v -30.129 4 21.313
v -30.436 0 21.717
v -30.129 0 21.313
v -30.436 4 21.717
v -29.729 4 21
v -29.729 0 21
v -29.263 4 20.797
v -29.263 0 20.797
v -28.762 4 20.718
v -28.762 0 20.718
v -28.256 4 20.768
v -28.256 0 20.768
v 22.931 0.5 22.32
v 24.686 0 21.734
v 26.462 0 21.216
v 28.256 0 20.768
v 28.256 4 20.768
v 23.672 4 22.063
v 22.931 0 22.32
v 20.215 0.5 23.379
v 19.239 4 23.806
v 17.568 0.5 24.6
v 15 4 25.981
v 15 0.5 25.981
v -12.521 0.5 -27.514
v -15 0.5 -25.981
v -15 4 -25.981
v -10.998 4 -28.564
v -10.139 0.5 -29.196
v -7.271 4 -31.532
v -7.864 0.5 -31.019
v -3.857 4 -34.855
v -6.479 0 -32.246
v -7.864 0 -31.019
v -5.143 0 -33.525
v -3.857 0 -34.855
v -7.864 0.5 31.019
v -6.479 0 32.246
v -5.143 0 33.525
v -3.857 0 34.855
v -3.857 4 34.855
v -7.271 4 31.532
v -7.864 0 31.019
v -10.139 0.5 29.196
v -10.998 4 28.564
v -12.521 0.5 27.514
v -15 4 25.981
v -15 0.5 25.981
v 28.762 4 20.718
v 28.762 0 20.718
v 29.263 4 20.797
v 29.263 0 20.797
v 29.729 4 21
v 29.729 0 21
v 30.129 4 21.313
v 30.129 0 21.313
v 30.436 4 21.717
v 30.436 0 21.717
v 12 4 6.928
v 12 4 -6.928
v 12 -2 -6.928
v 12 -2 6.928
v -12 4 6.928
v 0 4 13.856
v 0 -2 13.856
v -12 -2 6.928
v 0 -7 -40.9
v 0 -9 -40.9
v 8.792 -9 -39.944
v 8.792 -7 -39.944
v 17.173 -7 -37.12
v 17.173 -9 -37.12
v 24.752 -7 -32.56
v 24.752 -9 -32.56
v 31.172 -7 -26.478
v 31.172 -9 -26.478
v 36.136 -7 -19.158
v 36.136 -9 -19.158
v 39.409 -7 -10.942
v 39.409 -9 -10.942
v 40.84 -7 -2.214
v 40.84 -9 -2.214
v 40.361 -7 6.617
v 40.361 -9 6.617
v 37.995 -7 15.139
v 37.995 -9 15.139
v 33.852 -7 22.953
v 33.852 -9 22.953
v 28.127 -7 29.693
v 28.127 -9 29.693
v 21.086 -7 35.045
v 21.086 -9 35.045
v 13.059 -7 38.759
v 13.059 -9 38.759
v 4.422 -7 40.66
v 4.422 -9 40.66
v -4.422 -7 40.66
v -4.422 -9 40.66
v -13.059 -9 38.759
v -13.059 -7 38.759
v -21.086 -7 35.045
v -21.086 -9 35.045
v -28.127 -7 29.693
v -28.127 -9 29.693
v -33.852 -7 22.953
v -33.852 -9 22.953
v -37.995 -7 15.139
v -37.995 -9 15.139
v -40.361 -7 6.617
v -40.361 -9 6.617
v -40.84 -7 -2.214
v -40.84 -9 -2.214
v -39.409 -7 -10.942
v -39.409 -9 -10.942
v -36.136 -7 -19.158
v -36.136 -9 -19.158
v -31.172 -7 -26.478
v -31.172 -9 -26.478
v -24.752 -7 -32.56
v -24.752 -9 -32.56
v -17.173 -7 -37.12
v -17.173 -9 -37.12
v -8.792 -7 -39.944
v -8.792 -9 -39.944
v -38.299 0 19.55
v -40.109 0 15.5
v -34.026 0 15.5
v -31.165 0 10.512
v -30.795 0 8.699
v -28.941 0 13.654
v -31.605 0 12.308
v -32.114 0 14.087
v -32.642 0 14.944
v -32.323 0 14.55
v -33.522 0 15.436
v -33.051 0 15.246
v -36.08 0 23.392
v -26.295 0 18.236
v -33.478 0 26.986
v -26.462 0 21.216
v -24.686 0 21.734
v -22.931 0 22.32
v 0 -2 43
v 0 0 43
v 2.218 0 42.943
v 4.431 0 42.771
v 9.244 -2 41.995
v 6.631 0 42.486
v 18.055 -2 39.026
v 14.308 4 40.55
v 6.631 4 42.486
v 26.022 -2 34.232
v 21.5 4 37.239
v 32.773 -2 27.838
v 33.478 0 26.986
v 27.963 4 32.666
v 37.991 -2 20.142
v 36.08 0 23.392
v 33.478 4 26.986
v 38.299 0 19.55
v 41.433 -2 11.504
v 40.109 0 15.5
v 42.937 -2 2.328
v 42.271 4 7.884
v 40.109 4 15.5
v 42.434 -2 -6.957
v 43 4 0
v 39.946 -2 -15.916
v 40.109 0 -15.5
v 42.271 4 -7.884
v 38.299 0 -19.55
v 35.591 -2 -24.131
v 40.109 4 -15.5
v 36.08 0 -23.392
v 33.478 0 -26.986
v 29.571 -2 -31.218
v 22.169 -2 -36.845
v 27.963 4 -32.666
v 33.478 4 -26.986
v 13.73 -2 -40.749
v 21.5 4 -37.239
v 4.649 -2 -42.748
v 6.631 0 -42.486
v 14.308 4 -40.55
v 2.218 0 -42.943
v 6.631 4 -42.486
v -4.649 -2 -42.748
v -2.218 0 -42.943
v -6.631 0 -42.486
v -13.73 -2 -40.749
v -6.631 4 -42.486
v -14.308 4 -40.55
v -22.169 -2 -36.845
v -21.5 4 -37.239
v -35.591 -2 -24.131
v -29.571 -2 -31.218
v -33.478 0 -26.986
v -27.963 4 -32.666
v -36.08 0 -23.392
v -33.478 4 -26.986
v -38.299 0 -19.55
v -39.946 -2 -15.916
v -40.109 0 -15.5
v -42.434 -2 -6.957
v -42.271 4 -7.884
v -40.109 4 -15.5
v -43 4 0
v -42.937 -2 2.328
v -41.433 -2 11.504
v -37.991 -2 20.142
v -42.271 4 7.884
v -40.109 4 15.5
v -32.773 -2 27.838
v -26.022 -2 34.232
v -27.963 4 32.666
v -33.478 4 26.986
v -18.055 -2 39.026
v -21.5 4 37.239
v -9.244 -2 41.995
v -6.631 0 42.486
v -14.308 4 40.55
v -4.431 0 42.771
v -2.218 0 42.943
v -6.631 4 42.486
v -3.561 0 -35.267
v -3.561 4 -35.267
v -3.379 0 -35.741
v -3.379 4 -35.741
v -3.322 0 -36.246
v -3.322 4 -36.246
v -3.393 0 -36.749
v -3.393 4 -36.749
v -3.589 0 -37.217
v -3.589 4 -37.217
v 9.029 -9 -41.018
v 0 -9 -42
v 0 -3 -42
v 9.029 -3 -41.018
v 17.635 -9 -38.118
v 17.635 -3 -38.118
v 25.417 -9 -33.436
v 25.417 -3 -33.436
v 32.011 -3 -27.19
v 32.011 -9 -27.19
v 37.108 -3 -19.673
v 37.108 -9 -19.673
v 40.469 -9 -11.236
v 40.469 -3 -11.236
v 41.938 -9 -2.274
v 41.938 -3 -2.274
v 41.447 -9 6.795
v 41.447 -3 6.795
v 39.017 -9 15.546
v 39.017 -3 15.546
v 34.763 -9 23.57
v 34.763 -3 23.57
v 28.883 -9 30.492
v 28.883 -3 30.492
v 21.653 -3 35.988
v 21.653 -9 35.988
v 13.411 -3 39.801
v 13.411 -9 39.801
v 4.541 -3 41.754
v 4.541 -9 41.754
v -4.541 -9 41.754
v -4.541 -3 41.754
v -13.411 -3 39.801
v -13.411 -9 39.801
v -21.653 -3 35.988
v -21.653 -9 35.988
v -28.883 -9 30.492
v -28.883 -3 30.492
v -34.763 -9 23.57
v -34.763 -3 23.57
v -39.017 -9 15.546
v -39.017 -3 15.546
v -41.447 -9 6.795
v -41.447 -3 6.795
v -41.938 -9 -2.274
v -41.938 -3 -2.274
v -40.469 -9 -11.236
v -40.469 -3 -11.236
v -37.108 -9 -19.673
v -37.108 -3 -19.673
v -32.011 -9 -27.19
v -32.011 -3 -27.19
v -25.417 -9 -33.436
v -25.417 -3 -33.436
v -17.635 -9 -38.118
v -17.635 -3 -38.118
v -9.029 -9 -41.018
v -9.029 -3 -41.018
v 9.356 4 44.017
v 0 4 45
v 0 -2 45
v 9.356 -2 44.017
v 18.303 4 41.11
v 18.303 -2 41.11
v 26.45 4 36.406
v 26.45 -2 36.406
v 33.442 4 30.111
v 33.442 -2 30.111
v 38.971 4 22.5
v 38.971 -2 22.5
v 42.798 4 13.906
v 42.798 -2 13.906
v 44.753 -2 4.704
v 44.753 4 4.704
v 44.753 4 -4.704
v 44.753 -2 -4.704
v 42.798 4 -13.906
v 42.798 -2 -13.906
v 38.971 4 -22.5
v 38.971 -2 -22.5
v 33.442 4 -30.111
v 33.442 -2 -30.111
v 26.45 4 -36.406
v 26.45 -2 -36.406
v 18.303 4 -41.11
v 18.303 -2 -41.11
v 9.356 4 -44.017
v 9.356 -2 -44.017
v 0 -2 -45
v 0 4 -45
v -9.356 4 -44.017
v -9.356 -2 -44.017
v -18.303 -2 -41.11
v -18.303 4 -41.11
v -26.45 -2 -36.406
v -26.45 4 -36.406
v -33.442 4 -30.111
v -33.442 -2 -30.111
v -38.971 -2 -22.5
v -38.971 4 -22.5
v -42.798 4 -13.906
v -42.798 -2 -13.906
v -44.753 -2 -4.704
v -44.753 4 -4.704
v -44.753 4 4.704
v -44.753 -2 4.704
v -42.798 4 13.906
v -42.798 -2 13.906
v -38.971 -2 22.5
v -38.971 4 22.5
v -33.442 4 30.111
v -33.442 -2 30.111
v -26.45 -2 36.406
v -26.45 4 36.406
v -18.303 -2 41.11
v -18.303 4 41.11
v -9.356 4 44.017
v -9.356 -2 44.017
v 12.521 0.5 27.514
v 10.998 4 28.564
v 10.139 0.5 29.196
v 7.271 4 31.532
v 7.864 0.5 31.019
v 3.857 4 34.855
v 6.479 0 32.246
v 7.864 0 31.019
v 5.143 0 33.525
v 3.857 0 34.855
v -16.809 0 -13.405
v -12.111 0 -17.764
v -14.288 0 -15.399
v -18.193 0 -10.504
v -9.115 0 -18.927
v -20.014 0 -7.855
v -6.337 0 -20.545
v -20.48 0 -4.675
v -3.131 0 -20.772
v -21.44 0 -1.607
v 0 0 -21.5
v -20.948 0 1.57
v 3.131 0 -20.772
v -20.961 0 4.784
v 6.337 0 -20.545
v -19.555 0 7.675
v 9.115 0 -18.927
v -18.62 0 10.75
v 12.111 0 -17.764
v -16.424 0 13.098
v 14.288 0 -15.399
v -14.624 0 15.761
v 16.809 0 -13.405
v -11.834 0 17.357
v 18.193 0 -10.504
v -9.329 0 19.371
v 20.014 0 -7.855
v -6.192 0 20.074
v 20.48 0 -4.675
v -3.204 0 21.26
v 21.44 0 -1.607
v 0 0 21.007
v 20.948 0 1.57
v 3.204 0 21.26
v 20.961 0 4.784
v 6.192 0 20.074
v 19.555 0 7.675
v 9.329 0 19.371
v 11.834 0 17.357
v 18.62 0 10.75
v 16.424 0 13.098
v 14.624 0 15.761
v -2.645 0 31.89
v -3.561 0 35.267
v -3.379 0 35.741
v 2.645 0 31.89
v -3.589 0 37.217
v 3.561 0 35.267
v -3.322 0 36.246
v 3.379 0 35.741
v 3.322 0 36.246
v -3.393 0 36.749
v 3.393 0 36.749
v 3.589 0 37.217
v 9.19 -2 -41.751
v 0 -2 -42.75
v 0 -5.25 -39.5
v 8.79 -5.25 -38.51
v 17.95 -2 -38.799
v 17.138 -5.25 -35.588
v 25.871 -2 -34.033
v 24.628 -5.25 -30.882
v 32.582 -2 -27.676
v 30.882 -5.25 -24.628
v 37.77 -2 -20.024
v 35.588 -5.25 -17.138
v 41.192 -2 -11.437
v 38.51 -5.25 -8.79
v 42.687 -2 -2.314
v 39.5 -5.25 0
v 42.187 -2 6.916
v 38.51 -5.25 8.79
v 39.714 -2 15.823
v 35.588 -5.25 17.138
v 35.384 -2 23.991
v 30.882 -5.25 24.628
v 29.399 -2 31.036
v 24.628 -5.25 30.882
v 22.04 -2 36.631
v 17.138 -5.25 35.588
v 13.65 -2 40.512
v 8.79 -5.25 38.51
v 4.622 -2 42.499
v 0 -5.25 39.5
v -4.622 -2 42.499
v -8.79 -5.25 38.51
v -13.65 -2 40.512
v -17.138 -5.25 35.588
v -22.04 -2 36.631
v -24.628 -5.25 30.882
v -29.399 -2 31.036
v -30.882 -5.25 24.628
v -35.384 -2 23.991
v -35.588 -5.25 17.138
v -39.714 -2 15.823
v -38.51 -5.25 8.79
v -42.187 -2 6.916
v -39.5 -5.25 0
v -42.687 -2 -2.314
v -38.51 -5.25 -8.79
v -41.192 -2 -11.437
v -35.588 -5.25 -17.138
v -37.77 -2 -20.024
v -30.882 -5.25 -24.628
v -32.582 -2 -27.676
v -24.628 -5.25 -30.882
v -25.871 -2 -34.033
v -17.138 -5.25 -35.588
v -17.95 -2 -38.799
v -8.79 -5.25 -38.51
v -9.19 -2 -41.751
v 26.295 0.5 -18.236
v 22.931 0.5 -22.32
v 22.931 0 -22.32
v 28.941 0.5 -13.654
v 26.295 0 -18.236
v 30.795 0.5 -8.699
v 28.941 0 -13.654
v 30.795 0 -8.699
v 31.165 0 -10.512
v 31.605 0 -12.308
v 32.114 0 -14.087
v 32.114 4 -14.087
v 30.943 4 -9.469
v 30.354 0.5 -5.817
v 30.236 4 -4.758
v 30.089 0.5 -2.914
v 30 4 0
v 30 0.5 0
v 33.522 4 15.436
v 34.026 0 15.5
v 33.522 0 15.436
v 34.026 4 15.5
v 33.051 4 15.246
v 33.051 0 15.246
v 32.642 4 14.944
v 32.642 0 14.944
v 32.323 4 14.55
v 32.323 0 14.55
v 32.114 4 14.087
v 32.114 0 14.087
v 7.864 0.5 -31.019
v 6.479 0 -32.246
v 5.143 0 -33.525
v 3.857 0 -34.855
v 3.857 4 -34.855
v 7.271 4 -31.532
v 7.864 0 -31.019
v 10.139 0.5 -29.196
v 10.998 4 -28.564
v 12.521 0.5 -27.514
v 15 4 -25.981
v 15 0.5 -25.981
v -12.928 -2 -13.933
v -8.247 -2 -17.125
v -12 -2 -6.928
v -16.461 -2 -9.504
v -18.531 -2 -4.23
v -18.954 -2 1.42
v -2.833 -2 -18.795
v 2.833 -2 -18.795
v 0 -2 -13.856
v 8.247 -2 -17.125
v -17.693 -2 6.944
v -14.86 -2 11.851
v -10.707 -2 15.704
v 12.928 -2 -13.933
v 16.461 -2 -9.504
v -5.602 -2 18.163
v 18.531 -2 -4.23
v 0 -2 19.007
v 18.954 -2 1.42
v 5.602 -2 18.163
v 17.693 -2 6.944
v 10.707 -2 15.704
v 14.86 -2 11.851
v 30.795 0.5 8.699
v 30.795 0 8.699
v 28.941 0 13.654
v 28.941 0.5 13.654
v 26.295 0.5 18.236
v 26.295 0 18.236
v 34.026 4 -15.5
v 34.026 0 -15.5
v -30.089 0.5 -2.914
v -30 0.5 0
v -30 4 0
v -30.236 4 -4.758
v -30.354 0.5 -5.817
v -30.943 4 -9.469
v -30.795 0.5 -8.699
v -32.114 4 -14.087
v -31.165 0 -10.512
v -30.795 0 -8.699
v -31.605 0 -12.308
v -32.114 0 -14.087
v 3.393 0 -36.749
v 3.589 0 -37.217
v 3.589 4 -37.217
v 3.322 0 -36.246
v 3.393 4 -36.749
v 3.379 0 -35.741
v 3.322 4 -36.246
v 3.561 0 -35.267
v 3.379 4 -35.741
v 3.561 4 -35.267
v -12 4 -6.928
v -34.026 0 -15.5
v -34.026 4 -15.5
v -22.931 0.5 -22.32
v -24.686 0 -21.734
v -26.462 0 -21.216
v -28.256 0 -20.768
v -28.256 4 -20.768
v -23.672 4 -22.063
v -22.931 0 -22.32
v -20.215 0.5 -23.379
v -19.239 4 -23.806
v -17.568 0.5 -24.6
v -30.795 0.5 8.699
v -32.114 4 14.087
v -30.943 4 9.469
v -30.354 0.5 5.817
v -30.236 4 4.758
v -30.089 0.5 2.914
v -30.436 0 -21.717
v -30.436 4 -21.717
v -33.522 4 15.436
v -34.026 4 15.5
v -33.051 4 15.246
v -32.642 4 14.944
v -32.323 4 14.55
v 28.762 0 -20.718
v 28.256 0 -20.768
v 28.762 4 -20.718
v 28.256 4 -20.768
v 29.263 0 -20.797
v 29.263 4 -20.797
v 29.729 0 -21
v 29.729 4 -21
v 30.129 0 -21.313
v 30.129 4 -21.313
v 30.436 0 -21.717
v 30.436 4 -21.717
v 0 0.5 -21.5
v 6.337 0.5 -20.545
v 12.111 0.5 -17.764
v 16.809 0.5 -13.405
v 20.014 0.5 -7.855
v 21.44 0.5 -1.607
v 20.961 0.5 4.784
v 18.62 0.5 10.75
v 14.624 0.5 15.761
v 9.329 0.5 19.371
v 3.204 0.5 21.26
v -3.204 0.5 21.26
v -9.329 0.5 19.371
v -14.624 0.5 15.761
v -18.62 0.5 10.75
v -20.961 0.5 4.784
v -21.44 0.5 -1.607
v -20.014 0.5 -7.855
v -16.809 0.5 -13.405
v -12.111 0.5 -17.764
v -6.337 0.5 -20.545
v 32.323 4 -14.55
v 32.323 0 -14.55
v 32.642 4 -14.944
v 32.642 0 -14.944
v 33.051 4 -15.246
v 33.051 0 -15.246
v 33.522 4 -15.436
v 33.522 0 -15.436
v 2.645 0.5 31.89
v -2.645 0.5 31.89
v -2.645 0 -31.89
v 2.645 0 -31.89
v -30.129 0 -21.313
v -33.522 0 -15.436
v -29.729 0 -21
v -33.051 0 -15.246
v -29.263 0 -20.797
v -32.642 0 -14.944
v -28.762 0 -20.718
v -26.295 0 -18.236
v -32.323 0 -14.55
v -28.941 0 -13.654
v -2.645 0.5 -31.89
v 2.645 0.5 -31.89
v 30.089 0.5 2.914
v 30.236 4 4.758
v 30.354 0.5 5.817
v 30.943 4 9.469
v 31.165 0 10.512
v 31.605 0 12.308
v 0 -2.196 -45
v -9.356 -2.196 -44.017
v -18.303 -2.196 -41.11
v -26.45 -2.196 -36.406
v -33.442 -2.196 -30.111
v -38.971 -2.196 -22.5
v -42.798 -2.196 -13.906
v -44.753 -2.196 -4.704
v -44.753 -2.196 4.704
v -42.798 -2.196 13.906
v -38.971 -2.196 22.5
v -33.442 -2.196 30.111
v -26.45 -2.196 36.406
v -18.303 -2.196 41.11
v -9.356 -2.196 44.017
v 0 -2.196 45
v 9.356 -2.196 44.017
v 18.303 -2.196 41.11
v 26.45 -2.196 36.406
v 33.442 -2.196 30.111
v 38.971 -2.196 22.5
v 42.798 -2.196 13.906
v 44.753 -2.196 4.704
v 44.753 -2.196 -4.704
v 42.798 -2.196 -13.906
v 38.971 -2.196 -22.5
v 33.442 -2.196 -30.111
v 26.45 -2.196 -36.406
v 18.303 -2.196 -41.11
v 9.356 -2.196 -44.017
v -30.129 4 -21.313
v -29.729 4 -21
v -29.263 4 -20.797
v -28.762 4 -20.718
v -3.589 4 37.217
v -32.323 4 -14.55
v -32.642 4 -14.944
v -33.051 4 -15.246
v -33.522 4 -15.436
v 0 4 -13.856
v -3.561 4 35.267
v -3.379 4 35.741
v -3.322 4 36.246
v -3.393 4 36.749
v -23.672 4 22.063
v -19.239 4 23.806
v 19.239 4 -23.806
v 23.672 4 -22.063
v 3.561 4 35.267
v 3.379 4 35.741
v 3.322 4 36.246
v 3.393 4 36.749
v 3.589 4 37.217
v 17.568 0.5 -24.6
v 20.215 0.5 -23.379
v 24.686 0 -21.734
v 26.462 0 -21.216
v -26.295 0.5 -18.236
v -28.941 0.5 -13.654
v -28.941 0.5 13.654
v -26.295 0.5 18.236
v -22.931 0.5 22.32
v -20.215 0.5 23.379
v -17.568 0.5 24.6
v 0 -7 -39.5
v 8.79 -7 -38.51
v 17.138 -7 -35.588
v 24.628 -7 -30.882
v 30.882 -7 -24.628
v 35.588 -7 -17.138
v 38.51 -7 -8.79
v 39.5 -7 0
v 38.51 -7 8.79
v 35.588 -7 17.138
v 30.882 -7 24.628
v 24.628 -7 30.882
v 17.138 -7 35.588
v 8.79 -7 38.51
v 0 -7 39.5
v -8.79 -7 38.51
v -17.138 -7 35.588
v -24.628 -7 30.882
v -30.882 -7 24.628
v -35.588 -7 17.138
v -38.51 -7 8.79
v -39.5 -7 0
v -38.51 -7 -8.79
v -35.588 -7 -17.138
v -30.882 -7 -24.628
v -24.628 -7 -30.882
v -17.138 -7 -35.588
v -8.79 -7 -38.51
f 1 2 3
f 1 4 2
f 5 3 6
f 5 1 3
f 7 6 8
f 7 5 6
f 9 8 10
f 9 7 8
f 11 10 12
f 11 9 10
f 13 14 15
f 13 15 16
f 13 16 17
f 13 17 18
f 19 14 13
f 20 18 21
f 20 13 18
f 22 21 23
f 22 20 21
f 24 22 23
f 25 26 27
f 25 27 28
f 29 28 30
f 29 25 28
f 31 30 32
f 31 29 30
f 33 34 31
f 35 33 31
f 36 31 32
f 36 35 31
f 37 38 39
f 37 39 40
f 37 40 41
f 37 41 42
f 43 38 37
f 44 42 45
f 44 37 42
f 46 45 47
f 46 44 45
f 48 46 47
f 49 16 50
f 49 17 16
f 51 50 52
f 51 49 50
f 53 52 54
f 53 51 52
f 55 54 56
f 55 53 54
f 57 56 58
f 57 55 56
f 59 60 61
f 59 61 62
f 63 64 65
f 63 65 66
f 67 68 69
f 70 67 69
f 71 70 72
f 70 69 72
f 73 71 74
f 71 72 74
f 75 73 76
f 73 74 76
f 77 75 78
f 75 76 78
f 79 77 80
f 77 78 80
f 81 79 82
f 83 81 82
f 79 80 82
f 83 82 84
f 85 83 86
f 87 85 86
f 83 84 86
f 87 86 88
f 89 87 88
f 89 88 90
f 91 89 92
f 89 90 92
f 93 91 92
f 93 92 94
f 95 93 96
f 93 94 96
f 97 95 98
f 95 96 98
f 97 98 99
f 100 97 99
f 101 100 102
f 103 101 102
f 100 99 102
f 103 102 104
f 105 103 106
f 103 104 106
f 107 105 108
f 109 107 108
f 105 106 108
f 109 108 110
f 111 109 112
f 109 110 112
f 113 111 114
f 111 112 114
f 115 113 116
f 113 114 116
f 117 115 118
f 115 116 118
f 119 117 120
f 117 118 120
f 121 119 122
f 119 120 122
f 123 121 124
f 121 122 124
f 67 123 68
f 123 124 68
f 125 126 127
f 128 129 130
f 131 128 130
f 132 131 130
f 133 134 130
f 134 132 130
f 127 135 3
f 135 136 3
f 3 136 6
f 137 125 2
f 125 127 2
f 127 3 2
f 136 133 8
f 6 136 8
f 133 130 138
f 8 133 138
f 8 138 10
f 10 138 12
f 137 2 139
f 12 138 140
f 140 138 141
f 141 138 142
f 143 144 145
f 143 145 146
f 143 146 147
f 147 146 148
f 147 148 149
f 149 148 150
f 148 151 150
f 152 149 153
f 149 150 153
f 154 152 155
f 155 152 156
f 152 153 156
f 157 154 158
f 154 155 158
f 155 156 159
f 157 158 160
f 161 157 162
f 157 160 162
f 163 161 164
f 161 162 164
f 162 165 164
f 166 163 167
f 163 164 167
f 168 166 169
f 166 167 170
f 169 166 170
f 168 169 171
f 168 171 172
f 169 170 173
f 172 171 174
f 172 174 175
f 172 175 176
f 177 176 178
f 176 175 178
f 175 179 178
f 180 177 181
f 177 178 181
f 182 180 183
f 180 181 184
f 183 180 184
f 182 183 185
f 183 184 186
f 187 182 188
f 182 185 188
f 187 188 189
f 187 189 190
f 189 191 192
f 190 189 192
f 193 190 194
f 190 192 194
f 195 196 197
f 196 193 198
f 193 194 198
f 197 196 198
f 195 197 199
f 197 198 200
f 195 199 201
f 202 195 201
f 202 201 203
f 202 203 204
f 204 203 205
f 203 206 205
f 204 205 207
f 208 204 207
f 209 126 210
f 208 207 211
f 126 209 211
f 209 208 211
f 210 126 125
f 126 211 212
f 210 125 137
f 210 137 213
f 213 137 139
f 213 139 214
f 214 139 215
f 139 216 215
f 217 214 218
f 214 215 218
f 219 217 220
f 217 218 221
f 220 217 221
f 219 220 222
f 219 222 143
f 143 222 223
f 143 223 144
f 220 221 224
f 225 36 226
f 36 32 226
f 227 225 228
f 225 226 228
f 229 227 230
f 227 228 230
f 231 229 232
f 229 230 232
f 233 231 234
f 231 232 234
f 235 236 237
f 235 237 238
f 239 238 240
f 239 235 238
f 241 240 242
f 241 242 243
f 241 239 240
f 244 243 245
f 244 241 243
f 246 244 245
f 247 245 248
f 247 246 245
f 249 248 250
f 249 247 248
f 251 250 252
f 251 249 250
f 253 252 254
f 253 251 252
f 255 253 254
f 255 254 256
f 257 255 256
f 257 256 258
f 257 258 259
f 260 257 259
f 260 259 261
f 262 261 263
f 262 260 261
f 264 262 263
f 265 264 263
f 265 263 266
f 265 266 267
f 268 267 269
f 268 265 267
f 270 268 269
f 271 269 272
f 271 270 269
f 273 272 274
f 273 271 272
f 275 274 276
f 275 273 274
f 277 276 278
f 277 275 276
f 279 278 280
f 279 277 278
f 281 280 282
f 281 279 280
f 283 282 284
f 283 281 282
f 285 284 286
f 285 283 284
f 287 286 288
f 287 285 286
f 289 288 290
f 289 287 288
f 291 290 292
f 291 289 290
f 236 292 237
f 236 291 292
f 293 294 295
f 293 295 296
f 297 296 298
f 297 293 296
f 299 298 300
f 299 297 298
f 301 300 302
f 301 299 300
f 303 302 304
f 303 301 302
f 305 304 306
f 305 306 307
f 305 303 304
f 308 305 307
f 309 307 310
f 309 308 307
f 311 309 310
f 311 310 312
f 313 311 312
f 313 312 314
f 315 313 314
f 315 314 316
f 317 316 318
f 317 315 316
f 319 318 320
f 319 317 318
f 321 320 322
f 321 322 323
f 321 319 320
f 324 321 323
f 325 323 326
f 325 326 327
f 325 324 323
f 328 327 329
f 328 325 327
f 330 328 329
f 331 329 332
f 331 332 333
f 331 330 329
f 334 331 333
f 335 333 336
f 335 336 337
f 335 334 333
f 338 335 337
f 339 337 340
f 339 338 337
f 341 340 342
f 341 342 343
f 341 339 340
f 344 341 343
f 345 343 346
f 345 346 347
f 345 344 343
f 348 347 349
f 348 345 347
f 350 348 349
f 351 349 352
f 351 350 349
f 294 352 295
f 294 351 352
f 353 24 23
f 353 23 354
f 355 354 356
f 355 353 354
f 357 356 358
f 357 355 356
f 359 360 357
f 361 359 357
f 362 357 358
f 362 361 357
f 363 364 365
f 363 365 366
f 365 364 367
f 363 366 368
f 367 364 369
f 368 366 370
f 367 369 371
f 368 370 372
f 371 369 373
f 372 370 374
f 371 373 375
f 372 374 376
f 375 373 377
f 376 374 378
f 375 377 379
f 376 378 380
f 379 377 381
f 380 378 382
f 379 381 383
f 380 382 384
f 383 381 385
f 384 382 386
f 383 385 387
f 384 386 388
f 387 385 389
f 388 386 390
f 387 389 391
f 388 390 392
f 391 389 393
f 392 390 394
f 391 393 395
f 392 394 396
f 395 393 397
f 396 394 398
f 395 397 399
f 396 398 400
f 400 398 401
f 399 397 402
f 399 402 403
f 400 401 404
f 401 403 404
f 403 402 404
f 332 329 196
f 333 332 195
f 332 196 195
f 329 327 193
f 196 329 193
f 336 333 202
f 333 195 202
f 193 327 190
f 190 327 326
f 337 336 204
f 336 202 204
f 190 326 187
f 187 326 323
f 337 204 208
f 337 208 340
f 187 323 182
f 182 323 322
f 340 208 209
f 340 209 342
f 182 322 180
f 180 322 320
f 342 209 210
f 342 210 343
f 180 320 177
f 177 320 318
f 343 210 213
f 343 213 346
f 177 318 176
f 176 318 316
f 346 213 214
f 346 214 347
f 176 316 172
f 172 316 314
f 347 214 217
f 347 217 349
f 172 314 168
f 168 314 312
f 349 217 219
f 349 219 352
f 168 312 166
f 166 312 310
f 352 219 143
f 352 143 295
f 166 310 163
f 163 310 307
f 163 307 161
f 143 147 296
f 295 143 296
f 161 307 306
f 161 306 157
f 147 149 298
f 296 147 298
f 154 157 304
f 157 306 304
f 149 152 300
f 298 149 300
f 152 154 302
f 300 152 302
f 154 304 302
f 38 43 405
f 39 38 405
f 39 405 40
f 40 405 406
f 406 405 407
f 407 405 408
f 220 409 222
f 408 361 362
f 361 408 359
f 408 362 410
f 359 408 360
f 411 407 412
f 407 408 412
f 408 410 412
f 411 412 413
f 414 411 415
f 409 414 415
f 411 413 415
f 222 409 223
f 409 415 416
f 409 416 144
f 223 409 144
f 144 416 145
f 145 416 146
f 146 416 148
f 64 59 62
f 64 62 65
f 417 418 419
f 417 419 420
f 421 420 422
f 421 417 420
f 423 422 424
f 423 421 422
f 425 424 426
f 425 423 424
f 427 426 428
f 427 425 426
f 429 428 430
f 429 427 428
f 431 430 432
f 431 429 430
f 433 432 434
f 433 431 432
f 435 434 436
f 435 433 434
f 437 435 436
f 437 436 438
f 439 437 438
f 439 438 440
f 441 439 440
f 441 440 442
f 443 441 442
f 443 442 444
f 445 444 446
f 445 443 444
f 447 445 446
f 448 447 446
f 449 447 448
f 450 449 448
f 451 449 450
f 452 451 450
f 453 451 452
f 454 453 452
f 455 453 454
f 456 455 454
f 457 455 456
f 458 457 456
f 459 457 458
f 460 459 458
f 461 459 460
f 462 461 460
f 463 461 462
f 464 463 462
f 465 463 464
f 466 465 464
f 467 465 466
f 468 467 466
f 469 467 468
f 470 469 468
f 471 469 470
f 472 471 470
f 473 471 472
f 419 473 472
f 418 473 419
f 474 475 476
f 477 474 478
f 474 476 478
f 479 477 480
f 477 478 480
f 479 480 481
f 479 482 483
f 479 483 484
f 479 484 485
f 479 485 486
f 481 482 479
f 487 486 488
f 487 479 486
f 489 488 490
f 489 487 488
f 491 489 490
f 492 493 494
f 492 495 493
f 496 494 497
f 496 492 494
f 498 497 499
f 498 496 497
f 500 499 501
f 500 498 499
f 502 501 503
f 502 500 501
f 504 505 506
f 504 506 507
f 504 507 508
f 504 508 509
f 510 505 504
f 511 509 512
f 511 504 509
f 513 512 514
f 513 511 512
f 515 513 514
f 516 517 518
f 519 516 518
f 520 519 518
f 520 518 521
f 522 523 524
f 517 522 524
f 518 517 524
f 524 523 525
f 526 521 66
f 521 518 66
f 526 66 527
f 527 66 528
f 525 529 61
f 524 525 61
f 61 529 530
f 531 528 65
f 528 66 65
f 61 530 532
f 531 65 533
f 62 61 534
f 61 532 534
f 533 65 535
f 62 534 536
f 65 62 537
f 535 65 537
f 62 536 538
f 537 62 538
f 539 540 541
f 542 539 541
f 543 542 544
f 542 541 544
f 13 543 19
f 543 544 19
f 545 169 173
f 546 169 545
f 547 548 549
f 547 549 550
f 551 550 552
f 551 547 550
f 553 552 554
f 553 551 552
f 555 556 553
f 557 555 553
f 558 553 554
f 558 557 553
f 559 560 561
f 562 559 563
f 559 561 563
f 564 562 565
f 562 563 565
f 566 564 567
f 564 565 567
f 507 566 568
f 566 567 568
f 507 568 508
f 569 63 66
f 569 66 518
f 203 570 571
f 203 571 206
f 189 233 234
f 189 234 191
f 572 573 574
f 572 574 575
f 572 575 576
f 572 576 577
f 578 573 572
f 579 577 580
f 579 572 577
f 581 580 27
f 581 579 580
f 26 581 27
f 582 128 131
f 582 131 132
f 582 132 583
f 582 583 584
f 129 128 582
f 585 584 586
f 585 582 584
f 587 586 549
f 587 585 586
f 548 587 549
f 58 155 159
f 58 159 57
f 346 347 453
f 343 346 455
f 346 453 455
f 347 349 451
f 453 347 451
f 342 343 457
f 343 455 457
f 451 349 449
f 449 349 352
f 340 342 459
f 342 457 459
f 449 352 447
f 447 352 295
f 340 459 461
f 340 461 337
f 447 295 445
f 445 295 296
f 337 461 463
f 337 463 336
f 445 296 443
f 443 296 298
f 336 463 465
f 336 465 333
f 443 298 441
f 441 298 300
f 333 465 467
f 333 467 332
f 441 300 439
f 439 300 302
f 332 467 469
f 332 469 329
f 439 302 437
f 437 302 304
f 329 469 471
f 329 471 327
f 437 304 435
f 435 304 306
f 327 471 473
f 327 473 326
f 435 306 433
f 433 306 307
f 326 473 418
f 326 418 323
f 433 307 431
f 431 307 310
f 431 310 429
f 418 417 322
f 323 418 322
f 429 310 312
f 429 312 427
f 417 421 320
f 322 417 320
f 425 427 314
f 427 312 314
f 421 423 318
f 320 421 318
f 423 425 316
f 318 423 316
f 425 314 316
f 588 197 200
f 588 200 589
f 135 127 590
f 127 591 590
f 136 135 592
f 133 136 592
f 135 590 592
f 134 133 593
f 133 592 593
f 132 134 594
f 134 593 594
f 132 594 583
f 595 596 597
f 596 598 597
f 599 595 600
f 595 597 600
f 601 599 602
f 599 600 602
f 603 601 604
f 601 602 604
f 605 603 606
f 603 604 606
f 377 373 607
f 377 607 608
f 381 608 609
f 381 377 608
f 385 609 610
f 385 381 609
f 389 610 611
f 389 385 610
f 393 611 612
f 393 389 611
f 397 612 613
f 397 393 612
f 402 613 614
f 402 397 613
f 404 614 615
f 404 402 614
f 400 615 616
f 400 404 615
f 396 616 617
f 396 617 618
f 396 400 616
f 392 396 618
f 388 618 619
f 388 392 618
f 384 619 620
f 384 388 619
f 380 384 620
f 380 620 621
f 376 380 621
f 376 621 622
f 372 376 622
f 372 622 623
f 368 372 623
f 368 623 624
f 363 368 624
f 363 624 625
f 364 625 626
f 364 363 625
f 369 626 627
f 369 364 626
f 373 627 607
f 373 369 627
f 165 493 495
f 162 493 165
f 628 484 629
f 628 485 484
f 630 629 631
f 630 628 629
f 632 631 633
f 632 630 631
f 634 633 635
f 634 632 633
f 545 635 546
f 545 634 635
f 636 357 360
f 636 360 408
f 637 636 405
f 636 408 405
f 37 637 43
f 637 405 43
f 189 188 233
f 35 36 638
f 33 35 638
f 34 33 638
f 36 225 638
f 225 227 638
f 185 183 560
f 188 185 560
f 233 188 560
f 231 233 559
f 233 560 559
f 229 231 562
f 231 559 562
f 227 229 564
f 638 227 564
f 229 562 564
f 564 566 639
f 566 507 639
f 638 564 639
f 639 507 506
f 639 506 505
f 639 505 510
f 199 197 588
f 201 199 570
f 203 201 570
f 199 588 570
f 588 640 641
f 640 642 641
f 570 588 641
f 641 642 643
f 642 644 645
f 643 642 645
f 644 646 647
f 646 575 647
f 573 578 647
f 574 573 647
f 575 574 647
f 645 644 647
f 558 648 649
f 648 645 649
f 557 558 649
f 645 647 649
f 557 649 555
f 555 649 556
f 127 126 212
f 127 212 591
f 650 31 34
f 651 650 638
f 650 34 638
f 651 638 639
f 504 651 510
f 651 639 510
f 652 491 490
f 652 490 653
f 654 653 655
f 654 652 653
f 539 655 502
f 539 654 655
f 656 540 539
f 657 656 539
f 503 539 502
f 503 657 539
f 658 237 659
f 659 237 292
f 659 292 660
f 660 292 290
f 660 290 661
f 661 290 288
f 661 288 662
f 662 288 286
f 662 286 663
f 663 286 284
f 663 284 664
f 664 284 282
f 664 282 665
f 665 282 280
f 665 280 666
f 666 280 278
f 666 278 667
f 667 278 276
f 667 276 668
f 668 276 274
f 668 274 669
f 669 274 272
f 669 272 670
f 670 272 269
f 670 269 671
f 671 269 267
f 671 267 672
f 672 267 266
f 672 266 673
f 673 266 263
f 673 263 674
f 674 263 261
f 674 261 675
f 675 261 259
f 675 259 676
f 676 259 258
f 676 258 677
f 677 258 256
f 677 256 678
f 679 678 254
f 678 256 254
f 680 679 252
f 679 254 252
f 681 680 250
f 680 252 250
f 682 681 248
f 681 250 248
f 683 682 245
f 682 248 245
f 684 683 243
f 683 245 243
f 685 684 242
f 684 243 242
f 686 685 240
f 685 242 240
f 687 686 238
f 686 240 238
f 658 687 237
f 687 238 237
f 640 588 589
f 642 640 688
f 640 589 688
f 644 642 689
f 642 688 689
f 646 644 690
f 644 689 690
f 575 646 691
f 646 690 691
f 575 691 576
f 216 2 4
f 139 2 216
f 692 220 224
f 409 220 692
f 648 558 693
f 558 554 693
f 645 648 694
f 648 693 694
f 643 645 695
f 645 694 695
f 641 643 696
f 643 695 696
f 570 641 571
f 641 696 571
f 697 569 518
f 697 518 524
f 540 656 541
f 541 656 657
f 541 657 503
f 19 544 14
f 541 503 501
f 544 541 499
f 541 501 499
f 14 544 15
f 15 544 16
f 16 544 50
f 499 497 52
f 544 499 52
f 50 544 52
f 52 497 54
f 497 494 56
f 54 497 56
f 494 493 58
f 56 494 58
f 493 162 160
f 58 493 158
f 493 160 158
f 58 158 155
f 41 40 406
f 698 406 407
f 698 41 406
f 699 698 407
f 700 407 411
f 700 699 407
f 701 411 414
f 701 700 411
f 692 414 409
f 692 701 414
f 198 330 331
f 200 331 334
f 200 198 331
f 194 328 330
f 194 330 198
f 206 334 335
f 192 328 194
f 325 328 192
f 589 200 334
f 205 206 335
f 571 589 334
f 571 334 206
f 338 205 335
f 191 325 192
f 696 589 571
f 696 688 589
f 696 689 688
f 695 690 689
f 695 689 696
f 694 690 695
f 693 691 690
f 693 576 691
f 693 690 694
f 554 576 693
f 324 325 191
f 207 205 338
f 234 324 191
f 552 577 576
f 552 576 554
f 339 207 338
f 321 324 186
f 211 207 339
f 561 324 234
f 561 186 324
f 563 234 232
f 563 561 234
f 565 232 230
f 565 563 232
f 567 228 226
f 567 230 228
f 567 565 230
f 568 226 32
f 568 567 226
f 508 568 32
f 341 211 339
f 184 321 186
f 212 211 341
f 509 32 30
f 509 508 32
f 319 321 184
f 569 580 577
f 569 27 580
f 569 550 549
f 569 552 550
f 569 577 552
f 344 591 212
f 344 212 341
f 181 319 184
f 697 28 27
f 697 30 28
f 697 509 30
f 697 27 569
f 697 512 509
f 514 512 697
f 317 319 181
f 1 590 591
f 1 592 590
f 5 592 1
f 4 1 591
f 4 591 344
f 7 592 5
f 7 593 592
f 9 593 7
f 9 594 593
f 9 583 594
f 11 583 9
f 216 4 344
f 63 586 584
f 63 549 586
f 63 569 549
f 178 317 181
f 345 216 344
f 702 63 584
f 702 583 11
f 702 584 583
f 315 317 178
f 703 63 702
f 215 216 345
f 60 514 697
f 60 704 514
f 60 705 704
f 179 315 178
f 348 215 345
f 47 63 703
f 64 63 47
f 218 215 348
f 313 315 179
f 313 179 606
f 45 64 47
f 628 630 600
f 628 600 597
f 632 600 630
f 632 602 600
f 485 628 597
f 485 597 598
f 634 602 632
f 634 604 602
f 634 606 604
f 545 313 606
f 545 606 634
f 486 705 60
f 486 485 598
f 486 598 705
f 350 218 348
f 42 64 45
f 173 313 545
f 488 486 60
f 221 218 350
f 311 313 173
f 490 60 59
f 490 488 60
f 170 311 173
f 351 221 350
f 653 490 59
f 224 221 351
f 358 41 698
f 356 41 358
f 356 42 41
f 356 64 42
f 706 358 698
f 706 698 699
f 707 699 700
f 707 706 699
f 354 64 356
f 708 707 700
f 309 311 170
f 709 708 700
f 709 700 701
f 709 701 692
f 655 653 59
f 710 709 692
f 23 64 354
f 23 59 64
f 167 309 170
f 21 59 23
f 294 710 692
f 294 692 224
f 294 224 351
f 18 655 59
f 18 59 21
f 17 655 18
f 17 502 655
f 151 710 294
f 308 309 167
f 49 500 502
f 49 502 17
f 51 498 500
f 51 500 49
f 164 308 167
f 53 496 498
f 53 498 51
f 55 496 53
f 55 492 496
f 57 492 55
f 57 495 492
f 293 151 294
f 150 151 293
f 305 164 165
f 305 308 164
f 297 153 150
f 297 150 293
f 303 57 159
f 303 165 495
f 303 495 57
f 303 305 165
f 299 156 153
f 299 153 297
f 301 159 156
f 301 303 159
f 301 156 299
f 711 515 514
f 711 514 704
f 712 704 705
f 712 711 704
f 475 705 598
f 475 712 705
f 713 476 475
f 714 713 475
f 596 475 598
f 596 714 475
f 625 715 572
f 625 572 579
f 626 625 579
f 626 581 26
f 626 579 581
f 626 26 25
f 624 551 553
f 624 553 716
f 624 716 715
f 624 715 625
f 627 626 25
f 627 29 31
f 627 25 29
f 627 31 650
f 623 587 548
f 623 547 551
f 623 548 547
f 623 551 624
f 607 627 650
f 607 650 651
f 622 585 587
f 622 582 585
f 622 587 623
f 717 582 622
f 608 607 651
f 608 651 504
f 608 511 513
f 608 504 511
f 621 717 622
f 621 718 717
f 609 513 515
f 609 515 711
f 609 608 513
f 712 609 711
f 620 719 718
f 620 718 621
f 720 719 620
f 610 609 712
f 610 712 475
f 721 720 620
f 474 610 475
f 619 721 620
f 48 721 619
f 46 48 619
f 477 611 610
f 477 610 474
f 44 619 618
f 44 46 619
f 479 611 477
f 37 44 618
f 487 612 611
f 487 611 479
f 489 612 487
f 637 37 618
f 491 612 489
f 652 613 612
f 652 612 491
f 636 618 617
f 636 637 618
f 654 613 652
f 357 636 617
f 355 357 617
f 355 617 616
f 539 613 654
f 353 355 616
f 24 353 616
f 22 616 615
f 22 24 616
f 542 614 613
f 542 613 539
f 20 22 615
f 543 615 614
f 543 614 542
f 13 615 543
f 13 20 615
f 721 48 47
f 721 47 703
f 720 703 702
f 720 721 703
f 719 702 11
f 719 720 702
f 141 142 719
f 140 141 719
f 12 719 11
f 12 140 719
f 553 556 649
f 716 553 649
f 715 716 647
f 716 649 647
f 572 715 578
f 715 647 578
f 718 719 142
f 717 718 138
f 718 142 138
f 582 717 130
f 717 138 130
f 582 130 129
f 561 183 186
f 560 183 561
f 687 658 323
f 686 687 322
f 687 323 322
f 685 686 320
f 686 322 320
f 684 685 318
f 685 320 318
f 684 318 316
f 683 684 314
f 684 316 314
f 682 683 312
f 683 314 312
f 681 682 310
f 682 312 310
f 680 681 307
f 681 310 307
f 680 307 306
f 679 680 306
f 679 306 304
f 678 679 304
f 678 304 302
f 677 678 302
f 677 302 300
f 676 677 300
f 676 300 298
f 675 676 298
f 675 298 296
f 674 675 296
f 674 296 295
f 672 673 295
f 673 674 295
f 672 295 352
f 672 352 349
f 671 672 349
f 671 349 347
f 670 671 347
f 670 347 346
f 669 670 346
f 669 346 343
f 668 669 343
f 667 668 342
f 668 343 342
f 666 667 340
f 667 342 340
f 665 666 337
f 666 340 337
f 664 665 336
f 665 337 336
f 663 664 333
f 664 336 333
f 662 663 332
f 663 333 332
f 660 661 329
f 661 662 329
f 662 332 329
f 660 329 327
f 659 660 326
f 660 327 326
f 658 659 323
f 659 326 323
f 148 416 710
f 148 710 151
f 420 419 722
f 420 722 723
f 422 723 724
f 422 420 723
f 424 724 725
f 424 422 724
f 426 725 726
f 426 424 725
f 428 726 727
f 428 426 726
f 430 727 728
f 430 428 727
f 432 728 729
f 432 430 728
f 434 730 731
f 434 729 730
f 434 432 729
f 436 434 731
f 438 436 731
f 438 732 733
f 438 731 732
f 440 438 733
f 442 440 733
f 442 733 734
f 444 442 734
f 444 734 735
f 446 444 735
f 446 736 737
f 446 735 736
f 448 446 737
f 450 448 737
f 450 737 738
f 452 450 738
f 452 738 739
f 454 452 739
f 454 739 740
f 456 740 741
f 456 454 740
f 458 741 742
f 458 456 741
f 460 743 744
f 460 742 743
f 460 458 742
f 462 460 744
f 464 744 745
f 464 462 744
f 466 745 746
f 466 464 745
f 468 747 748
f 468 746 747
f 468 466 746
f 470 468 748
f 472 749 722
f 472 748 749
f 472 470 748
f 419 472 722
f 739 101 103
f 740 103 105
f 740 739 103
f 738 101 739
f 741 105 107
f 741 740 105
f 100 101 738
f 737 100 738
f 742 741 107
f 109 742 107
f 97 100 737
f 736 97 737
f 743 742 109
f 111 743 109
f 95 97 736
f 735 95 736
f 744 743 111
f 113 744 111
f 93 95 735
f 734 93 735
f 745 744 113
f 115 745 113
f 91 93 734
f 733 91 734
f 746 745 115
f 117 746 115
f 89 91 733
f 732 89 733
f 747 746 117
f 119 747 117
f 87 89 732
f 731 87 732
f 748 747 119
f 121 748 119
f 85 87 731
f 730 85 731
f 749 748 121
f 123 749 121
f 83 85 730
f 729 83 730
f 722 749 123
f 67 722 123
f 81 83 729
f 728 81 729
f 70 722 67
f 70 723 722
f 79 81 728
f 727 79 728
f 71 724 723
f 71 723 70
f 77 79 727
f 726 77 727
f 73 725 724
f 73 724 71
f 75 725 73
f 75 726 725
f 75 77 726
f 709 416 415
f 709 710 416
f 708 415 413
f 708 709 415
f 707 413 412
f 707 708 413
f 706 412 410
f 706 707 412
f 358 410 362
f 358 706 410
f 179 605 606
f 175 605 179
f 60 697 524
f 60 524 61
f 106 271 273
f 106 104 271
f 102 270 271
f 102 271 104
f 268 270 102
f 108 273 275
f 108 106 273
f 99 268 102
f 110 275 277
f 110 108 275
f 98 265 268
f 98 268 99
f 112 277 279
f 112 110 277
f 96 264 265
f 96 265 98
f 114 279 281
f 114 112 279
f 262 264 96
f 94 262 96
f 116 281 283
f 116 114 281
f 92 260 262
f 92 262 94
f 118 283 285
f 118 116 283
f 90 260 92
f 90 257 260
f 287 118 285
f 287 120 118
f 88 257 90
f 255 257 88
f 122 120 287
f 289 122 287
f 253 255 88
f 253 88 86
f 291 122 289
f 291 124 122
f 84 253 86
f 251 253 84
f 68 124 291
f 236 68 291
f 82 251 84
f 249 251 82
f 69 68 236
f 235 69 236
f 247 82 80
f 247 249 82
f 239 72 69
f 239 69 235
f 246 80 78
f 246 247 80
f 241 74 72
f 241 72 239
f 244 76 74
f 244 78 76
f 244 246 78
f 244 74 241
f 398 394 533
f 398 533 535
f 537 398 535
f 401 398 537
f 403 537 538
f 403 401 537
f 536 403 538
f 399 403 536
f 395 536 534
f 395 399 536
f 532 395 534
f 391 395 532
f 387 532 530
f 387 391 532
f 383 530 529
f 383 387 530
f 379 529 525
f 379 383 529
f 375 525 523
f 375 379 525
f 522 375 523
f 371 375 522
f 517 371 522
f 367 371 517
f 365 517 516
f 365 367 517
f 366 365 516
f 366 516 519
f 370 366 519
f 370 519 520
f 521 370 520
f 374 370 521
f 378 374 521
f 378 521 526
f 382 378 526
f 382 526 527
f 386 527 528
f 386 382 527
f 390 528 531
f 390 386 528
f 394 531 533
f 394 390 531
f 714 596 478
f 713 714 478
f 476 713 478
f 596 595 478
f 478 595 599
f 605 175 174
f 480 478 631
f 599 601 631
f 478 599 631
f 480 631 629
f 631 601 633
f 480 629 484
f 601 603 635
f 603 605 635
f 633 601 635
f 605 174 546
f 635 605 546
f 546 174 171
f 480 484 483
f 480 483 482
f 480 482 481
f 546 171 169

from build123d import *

# Parameters (mm, degrees)
SKIZZE1_R                            = 44
AUFSATZ_LINEAR_AUSTRAGEN1_DEPTH      = 4
SCHNITT_LINEAR_START                 = -10
SCHNITT_LINEAR_AUSTRAGEN2_DEPTH      = 10
SKIZZE4_R                            = 21.007106764
AUFSATZ_LINEAR_AUSTRAGEN4_DEPTH      = 6
KREISMUSTER1_COUNT                   = 6
SCHNITT_LINEAR_AUSTRAGEN3_DEPTH      = 4
SCHNITT_LINEAR_AUSTRAGEN3_DEPTH_BACK = 10
VERRUNDUNG1_R                        = 2
SKIZZE8_R                            = 45
SKIZZE8_R_2                          = 43
AUFSATZ_LINEAR_AUSTRAGEN2_DEPTH      = 6
SKIZZE9_R                            = 45
SKIZZE9_R_2                          = 39.5
AUFSATZ_LINEAR_AUSTRAGEN3_DEPTH      = 7
FASE1_SIZE                           = 3.25
SKIZZE7_R                            = 32
SKIZZE7_R_2                          = 21.5
SCHNITT_LINEAR_AUSTRAGEN7_DEPTH      = 0.5
SKIZZE10_R                           = 50
SKIZZE10_R_2                         = 42
SCHNITT_LINEAR_AUSTRAGEN9_DEPTH      = 6
SKIZZE11_R                           = 40.9
SKIZZE11_R_2                         = 30
SCHNITT_LINEAR_AUSTRAGEN10_DEPTH     = 2
FASE2_SIZE                           = 0.803847577
FASE2_SIZE_2                         = 3
FASE3_SIZE                           = 2


# Some blends are built 0.0001 mm under size
with BuildPart() as part:
    # Skizze1 → Aufsatz-Linear austragen1 (new body)
    with BuildSketch(Plane(origin=(0, 0, 0), x_dir=(1, 0, 0), z_dir=(0, 1, 0))):
        with Locations(Location((0, 0, 0), (0, 0, 270))):
            Circle(SKIZZE1_R)
    extrude(amount=AUFSATZ_LINEAR_AUSTRAGEN1_DEPTH)

    # Skizze2 → Schnitt-Linear austragen2 (cut)
    with BuildSketch(Plane(origin=(0, 4, 0), x_dir=(1, 0, 0), z_dir=(0, 1, 0)).offset(SCHNITT_LINEAR_START)):
        with BuildLine():
            ThreePointArc((-30, 0), (-30.647234858, 7.855929826), (-32.571484726, 15.5))
            Line((-32.571484726, 15.5), (-41.179485184, 15.5))
            ThreePointArc((-41.179485184, 15.5), (-44, 0), (-41.179485184, -15.5))
            Line((-41.179485184, -15.5), (-32.571484726, -15.5))
            ThreePointArc((-32.571484726, -15.5), (-30.647234858, -7.855929826), (-30, 0))
        make_face()
    schnitt_linear_austragen2 = extrude(amount=SCHNITT_LINEAR_AUSTRAGEN2_DEPTH, mode=Mode.SUBTRACT)

    # Skizze4 → Aufsatz-Linear austragen4 (add)
    with BuildSketch(Plane(origin=(0, 4, 0), x_dir=(1, 0, 0), z_dir=(0, 1, 0))):
        with Locations(Location((0, 0, 0), (0, 0, 270))):
            Circle(SKIZZE4_R)
    extrude(amount=-AUFSATZ_LINEAR_AUSTRAGEN4_DEPTH)

    # Kreismuster1: Schnitt-Linear austragen2 ×6 about axis
    kreismuster1_axis = Axis((0, 0, 0), (0, 1, 0))
    for i in range(1, KREISMUSTER1_COUNT):
        add(schnitt_linear_austragen2.rotate(kreismuster1_axis, i * 360 / KREISMUSTER1_COUNT), mode=Mode.SUBTRACT)

    # Skizze3 → Schnitt-Linear austragen3 (cut, two sides: drawn at the far end of the back side and taken through both)
    with BuildSketch(Plane.XZ.offset(-SCHNITT_LINEAR_AUSTRAGEN3_DEPTH_BACK)):
        Polygon((12, 6.92820323), (0, 13.856406461), (-12, 6.92820323), (-12, -6.92820323), (0, -13.856406461), (12, -6.92820323), align=None)
    extrude(amount=SCHNITT_LINEAR_AUSTRAGEN3_DEPTH + SCHNITT_LINEAR_AUSTRAGEN3_DEPTH_BACK, mode=Mode.SUBTRACT)

    # Verrundung1
    verrundung1_edges = [part.edges().sort_by_distance(p)[0] for p in [
        (-32.571484726, 2, 15.5),
        (-32.571484726, 2, -15.5),
        (-29.709136122, 2, -20.457733212),
        (-2.862348604, 2, -35.957733212),
        (2.862348604, 2, -35.957733212),
        (29.709136122, 2, -20.457733212),
        (32.571484726, 2, -15.5),
        (32.571484726, 2, 15.5),
        (29.709136122, 2, 20.457733212),
        (2.862348604, 2, 35.957733212),
        (-2.862348604, 2, 35.957733212),
        (-29.709136122, 2, 20.457733212),
    ]]
    fillet(verrundung1_edges, radius=VERRUNDUNG1_R)

    # Skizze8 → Aufsatz-Linear austragen2 (add)
    with BuildSketch(Plane(origin=(0, 4, 0), x_dir=(1, 0, 0), z_dir=(0, 1, 0))):
        with Locations(Location((0, 0, 0), (0, 0, 270))):
            Circle(SKIZZE8_R)
        with Locations(Location((0, 0, 0), (0, 0, 270))):
            Circle(SKIZZE8_R_2, mode=Mode.SUBTRACT)
    extrude(amount=-AUFSATZ_LINEAR_AUSTRAGEN2_DEPTH)

    # Skizze7 → Schnitt-Linear austragen7 (cut)
    with BuildSketch(Plane.XZ):
        Circle(SKIZZE7_R)
        with Locations(Location((0, 0, 0), (0, 0, 270))):
            Circle(SKIZZE7_R_2, mode=Mode.SUBTRACT)
    extrude(amount=-SCHNITT_LINEAR_AUSTRAGEN7_DEPTH, mode=Mode.SUBTRACT)

    # Fase3
    fase3_edges = [part.edges().sort_by_distance(p)[0] for p in [
        (0, -2, -21.007106764),
    ]]
    chamfer(fase3_edges, length=FASE3_SIZE - 0.0001)  # a hair under: the kernel refuses the full size


with BuildPart() as body_2:
    # Skizze9 → Aufsatz-Linear austragen3 (new body)
    with BuildSketch(Plane.XZ.offset(2)):
        with Locations(Location((0, 0, 0), (0, 0, 270))):
            Circle(SKIZZE9_R)
        with Locations(Location((0, 0, 0), (0, 0, 270))):
            Circle(SKIZZE9_R_2, mode=Mode.SUBTRACT)
    extrude(amount=AUFSATZ_LINEAR_AUSTRAGEN3_DEPTH)

    # Fase1
    fase1_edges = [body_2.edges().sort_by_distance(p)[0] for p in [
        (0, -2, 39.5),
    ]]
    chamfer(fase1_edges, length=FASE1_SIZE)

    # Skizze10 → Schnitt-Linear austragen9 (cut)
    with BuildSketch(Plane.XZ.offset(9)):
        Circle(SKIZZE10_R)
        with Locations(Location((0, 0, 0), (0, 0, 270))):
            Circle(SKIZZE10_R_2, mode=Mode.SUBTRACT)
    extrude(amount=-SCHNITT_LINEAR_AUSTRAGEN9_DEPTH, mode=Mode.SUBTRACT)

    # Skizze11 → Schnitt-Linear austragen10 (cut)
    with BuildSketch(Plane.XZ.offset(9)):
        with Locations(Location((0, 0, 0), (0, 0, 270))):
            Circle(SKIZZE11_R)
        with Locations((-1.948563864, 1.772578218)):
            Circle(SKIZZE11_R_2, mode=Mode.SUBTRACT)
    extrude(amount=-SCHNITT_LINEAR_AUSTRAGEN10_DEPTH, mode=Mode.SUBTRACT)

    # Fase2
    # the kernel refuses this chamfer: 3, 0.803847577 mm, written as the material it takes off along each edge
    with BuildSketch(Plane(origin=(0, -3, 0), x_dir=(0, 0, -1), z_dir=(1, 0, 0))) as fase2_piece_1_section:
        Polygon((45, FASE2_SIZE), (45 - FASE2_SIZE_2, 0), (45, 0), align=None)
    fase2_piece_1 = revolve(axis=Axis((0, -3, 0), (0, 1, 0)), mode=Mode.PRIVATE)
    fase2_piece_1 = fase2_piece_1 - Plane(origin=(0, -2.653988874, 0), x_dir=(0, 0, -1), z_dir=(0, -1, 0)) * Cylinder(42, 180, mode=Mode.PRIVATE)
    add(fase2_piece_1, mode=Mode.SUBTRACT)


solid = Compound([part.part, body_2.part])
